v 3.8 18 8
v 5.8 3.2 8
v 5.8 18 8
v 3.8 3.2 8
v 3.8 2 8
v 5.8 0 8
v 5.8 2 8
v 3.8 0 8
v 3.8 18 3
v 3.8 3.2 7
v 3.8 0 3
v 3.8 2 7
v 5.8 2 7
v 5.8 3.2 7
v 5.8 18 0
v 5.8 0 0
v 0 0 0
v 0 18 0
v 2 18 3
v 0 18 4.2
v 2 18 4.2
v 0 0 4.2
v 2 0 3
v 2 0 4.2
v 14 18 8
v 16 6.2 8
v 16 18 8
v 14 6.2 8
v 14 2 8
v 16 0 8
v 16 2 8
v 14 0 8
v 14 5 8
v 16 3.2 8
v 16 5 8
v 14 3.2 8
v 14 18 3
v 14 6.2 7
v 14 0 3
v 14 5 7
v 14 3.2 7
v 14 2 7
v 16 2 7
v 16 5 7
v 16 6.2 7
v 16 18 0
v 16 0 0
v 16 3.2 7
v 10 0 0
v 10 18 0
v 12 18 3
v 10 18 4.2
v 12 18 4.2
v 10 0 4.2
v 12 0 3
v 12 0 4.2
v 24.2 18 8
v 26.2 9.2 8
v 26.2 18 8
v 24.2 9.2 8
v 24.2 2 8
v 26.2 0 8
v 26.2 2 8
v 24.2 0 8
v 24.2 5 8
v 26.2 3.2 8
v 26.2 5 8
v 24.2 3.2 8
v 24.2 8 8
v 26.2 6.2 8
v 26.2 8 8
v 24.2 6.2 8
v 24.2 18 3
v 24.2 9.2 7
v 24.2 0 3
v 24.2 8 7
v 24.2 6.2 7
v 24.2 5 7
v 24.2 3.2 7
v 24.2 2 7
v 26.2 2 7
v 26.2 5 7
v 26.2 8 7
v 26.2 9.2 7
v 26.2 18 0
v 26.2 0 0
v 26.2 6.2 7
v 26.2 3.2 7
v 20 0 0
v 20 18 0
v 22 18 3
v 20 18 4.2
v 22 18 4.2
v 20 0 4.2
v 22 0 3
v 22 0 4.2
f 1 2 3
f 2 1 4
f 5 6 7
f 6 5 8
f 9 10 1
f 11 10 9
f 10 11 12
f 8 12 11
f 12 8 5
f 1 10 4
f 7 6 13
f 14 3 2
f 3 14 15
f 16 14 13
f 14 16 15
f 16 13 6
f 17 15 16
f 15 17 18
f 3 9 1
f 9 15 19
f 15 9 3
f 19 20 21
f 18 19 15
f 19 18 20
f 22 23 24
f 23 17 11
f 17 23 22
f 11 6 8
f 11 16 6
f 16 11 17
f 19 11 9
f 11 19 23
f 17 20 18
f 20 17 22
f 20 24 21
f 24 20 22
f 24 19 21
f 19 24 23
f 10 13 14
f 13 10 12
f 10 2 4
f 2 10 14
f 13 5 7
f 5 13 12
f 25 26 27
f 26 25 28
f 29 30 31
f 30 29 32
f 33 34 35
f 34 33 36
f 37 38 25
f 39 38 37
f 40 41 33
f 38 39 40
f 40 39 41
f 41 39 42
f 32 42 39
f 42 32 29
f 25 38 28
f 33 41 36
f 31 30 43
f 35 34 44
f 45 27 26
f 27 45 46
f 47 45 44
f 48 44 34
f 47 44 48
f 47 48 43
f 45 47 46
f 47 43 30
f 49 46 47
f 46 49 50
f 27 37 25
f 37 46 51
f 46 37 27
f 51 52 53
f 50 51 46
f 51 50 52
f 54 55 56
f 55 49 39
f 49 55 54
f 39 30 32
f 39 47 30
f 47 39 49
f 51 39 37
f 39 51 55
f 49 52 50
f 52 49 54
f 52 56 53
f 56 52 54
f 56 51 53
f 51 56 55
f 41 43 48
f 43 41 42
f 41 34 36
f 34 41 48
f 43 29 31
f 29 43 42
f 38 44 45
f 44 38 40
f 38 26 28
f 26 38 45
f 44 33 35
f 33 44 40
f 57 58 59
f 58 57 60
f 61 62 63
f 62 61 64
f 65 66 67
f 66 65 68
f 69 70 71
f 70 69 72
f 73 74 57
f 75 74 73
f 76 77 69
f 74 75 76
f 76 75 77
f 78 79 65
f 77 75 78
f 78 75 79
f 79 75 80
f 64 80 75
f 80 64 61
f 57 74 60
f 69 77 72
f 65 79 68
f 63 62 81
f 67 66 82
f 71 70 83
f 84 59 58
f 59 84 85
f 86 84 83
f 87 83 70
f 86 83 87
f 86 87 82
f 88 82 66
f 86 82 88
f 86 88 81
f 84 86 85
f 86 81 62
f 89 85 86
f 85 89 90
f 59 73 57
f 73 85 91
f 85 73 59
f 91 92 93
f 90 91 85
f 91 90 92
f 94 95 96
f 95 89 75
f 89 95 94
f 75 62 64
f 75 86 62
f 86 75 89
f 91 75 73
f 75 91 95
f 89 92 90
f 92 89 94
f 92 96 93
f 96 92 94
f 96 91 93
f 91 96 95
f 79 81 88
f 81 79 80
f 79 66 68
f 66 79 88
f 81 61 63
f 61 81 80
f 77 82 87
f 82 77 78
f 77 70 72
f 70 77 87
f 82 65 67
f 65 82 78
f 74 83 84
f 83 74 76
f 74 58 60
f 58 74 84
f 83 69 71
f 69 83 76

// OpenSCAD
// FIT COUPONS ONLY. Print on outer wall in the supplied orientation. Units mm.
// 1 / 2 / 3 edge notches correspond to 1.8 / 2.0 / 2.2 mm nominal gaps.
// Gap 1.8 mm; identification notches: 1
translate([0,0,0]) { translate([5.8, 0, 0]) { rotate([0, -90, 0]) { difference() {
union() {
cube([8.0,18.0,2.0]);
cube([3.0,18.0,5.8]);
translate([0, 0, 3.8]) { cube([4.2,18.0,2.0]); }
}
translate([7.0, 2, -0.02]) { cube([1.05,1.2,2.04]); }
} } } }
// Gap 2 mm; identification notches: 2
translate([10,0,0]) { translate([6.0, 0, 0]) { rotate([0, -90, 0]) { difference() {
union() {
cube([8.0,18.0,2.0]);
cube([3.0,18.0,6.0]);
translate([0, 0, 4.0]) { cube([4.2,18.0,2.0]); }
}
translate([7.0, 2, -0.02]) { cube([1.05,1.2,2.04]); }
translate([7.0, 5, -0.02]) { cube([1.05,1.2,2.04]); }
} } } }
// Gap 2.2 mm; identification notches: 3
translate([20,0,0]) { translate([6.2, 0, 0]) { rotate([0, -90, 0]) { difference() {
union() {
cube([8.0,18.0,2.0]);
cube([3.0,18.0,6.2]);
translate([0, 0, 4.2]) { cube([4.2,18.0,2.0]); }
}
translate([7.0, 2, -0.02]) { cube([1.05,1.2,2.04]); }
translate([7.0, 5, -0.02]) { cube([1.05,1.2,2.04]); }
translate([7.0, 8, -0.02]) { cube([1.05,1.2,2.04]); }
} } } }
